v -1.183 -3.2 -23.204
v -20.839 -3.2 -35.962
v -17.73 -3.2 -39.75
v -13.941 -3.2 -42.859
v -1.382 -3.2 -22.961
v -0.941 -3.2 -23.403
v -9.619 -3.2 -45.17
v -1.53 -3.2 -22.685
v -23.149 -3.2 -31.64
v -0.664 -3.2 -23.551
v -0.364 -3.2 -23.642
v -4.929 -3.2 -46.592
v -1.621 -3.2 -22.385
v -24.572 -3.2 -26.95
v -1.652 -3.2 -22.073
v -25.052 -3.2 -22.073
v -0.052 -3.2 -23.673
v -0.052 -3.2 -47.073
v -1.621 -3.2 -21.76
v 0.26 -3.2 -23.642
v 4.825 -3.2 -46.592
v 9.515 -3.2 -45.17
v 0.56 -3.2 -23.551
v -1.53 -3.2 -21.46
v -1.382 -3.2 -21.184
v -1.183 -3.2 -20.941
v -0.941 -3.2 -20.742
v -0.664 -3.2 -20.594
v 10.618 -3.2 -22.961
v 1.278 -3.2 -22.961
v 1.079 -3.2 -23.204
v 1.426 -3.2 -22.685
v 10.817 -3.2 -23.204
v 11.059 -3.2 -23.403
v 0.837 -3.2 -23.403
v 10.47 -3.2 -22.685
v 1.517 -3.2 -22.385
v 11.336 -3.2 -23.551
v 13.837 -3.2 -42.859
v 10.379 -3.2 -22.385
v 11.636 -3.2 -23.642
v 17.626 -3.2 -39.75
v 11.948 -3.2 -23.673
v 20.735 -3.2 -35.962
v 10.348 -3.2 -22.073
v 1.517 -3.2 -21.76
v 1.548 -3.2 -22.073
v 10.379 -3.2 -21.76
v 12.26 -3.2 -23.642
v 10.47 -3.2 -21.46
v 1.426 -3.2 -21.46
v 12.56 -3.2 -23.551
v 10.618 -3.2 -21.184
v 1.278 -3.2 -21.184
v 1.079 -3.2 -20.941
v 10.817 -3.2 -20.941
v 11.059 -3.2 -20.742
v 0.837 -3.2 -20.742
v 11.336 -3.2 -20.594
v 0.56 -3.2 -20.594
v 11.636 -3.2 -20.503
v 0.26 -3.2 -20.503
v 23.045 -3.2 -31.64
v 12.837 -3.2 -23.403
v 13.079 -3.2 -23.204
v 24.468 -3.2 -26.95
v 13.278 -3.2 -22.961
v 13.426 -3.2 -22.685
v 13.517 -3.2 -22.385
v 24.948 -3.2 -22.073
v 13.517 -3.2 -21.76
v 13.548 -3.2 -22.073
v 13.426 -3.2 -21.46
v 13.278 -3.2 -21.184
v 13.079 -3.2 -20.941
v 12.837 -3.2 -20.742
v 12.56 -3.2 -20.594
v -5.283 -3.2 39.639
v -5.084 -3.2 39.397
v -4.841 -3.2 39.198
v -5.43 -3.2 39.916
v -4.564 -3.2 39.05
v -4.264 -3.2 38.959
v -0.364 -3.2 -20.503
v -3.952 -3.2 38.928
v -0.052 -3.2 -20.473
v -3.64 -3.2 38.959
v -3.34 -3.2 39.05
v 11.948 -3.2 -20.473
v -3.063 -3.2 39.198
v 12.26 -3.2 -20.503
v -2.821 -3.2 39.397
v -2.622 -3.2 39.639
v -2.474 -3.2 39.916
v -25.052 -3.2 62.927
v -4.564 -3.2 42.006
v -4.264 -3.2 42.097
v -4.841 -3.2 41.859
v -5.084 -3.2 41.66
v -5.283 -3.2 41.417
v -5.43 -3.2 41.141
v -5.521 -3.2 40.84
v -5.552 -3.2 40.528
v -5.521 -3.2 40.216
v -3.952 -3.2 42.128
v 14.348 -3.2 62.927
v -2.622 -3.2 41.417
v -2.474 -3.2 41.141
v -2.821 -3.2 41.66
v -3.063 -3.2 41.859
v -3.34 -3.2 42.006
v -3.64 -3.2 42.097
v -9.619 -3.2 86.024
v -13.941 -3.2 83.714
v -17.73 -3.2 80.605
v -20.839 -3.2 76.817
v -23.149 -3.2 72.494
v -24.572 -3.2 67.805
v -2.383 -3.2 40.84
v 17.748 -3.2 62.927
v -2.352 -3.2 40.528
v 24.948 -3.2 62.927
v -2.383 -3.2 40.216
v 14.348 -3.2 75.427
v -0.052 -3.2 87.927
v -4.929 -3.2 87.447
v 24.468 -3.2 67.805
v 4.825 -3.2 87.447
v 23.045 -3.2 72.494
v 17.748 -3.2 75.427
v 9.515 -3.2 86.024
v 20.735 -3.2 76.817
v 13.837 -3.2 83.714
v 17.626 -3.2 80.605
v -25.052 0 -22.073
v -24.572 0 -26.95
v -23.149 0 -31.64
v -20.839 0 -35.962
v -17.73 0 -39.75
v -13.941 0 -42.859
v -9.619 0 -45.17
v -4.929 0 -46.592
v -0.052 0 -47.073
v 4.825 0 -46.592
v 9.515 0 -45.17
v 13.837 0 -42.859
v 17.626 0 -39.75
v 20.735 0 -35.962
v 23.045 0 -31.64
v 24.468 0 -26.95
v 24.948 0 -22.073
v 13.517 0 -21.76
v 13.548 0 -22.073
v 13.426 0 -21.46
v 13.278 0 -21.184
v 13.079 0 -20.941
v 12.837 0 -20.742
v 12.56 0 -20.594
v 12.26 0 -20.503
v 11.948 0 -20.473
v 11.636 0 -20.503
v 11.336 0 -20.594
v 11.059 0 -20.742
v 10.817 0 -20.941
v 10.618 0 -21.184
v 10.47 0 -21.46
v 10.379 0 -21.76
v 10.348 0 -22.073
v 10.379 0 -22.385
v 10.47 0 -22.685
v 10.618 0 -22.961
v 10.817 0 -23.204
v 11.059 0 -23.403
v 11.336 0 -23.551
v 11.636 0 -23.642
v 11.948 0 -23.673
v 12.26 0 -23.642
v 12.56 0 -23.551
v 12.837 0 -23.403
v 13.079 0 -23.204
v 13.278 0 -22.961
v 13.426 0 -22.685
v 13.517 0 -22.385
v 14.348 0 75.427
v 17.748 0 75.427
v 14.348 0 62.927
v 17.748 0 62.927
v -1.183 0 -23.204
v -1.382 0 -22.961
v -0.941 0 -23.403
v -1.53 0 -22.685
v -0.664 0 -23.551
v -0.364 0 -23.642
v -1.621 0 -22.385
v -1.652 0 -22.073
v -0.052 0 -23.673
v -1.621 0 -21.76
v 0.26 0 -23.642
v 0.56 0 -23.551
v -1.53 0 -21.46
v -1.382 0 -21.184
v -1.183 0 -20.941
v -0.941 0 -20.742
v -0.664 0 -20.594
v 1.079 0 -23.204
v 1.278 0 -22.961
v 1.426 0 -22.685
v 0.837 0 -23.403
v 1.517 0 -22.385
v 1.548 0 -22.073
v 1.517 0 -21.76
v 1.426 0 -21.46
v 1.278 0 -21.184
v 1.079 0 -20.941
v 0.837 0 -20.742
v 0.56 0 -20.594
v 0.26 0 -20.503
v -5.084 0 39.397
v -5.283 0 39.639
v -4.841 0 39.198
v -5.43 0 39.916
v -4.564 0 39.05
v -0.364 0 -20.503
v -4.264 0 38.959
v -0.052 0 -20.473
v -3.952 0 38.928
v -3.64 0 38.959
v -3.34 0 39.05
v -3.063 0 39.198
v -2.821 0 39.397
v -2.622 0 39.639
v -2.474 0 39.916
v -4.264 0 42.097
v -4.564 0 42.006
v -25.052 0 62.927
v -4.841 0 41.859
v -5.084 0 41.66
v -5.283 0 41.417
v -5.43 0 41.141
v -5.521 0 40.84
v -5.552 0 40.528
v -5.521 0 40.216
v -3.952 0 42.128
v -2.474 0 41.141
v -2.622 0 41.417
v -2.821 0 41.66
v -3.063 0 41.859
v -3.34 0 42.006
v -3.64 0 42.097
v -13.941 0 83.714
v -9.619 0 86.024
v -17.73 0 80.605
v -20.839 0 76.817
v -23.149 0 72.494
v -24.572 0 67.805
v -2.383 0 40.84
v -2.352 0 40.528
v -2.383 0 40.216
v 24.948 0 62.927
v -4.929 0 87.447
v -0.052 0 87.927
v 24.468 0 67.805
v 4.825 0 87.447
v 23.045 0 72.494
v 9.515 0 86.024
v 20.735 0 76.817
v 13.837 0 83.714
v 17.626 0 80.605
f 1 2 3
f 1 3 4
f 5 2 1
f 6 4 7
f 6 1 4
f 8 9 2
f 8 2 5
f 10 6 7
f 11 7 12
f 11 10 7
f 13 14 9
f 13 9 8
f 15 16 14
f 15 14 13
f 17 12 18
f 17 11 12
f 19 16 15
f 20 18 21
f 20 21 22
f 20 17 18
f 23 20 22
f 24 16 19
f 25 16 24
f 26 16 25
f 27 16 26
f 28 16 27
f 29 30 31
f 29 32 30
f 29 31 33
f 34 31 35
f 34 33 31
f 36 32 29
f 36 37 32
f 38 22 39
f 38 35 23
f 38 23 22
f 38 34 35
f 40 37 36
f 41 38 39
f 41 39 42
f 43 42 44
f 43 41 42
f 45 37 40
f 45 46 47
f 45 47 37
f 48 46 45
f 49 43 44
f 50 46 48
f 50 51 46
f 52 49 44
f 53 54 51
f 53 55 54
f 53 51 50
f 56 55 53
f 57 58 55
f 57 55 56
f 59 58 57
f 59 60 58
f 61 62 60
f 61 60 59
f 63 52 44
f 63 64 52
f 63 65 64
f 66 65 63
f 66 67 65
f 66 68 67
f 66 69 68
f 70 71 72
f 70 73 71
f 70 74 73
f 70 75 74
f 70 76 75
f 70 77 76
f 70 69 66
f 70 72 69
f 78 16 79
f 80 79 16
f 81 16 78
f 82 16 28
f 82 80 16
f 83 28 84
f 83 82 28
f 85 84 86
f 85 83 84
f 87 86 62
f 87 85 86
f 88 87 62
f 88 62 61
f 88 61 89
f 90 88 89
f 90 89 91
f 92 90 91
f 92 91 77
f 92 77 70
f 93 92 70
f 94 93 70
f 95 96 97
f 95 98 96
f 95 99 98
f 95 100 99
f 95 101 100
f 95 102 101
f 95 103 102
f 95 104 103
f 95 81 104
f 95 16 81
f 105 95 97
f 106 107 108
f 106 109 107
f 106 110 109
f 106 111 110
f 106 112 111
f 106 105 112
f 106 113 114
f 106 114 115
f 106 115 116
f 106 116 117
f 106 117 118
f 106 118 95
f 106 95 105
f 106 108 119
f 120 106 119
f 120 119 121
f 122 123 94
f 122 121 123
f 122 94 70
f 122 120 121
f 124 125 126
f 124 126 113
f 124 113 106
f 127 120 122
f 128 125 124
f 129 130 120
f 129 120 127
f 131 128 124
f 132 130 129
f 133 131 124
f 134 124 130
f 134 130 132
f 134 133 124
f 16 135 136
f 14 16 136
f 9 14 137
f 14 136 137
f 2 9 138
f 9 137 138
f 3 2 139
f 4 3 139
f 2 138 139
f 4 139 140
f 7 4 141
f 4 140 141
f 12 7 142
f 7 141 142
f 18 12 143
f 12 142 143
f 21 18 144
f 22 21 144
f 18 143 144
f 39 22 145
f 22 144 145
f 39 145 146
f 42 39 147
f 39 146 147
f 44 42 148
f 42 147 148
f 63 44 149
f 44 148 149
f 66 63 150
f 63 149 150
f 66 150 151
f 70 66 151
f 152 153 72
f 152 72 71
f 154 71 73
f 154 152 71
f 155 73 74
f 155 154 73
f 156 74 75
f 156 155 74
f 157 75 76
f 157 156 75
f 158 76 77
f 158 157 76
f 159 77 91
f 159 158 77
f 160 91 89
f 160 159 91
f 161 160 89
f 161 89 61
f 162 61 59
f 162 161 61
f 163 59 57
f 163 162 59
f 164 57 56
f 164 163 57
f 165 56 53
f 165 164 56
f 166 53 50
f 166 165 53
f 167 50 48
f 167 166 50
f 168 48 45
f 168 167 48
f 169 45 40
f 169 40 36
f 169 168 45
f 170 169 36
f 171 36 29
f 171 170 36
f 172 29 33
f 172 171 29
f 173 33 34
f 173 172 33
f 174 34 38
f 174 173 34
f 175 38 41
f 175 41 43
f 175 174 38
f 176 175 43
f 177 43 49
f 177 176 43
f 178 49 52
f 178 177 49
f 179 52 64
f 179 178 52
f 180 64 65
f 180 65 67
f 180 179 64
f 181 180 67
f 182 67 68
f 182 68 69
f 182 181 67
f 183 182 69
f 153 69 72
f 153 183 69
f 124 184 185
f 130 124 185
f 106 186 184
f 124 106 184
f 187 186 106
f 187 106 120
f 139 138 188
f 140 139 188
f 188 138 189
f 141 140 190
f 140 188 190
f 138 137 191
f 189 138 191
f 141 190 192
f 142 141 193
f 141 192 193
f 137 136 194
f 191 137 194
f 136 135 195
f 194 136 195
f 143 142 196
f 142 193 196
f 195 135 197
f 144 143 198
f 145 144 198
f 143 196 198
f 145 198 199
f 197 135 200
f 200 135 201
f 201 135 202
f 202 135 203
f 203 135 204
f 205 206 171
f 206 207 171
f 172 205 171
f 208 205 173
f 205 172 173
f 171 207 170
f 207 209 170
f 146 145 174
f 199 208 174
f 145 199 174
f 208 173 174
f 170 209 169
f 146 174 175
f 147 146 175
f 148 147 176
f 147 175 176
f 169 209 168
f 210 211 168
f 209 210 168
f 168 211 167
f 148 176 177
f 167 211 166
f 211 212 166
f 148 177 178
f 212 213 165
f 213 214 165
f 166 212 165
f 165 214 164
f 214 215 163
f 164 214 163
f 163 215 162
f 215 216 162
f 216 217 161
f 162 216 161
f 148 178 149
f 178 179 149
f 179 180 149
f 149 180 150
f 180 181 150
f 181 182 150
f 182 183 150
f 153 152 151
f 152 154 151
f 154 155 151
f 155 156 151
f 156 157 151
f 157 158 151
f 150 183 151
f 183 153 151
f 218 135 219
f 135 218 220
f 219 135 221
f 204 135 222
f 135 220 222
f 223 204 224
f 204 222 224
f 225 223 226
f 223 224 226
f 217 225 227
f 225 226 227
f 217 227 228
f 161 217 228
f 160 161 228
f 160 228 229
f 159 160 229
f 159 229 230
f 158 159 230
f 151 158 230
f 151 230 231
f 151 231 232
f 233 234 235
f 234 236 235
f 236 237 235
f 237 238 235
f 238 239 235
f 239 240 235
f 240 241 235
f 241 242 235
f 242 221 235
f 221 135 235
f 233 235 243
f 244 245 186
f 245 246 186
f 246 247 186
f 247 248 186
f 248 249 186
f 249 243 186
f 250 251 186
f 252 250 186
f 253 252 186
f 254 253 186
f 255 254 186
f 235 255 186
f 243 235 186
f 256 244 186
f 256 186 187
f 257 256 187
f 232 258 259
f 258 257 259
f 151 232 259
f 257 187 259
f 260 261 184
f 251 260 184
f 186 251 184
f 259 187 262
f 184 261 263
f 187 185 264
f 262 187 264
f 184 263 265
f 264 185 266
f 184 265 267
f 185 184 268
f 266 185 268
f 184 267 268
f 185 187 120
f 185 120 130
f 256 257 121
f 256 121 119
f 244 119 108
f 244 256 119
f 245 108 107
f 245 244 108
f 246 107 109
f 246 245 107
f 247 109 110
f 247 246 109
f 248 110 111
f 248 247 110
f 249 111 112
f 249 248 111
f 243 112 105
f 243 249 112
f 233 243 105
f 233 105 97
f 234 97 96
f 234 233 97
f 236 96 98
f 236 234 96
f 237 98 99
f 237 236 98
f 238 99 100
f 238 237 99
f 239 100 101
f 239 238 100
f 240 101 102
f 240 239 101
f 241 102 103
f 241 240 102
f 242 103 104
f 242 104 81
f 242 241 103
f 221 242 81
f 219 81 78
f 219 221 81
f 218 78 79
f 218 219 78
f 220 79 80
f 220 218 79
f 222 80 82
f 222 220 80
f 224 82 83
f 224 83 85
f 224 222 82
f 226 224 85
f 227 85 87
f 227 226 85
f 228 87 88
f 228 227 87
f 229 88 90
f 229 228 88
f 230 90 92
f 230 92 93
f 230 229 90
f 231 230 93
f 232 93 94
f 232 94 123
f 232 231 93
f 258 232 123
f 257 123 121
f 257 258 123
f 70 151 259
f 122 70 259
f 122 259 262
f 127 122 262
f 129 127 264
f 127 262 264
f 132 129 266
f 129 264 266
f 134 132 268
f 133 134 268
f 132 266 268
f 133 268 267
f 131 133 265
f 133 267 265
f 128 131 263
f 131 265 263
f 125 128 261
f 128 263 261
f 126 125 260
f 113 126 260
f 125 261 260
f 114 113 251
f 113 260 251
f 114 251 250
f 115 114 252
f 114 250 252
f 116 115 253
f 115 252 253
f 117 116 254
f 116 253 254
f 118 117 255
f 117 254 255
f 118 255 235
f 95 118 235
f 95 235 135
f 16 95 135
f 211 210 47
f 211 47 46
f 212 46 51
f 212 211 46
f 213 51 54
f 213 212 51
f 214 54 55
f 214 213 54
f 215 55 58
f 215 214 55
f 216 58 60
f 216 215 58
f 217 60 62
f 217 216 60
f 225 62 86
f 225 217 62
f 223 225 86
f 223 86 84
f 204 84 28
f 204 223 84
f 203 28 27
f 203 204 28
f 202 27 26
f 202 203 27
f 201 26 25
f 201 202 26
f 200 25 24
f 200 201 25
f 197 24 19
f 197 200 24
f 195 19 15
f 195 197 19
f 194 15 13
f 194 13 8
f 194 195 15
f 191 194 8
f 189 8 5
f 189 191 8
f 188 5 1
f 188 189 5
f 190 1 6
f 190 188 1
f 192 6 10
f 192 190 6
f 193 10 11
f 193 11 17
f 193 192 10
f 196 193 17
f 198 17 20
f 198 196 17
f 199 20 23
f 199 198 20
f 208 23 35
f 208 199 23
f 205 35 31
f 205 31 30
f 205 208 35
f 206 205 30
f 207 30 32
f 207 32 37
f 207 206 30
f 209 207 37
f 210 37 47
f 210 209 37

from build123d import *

# Parameters (mm, degrees)
F0_R     = 1.6
F0_W     = 3.4
F0_H     = 12.5
F1_DEPTH = 3.2


with BuildPart() as f1:
    # F0 (on Front) → F1 (new body)
    with BuildSketch(Plane.XZ):
        with BuildLine():
            Line((-25.051908, 62.927413), (-25.051908, -22.072587))
            ThreePointArc((-25.051908, -22.072587), (-0.051908, -47.072587), (24.948092, -22.072587))
            Line((24.948092, -22.072587), (24.948092, 62.927413))
            ThreePointArc((24.948092, 62.927413), (-0.051908, 87.927413), (-25.051908, 62.927413))
        make_face()
        with Locations((-0.051908, -22.072587)):
            Circle(F0_R, mode=Mode.SUBTRACT)
        with Locations((11.948092, -22.072587)):
            Circle(F0_R, mode=Mode.SUBTRACT)
        with Locations((-3.952201, 40.528232)):
            Circle(F0_R, mode=Mode.SUBTRACT)
        with Locations((16.048092, 69.17741)):
            Rectangle(F0_W, F0_H, mode=Mode.SUBTRACT)
    extrude(amount=F1_DEPTH)


solid = f1.part
